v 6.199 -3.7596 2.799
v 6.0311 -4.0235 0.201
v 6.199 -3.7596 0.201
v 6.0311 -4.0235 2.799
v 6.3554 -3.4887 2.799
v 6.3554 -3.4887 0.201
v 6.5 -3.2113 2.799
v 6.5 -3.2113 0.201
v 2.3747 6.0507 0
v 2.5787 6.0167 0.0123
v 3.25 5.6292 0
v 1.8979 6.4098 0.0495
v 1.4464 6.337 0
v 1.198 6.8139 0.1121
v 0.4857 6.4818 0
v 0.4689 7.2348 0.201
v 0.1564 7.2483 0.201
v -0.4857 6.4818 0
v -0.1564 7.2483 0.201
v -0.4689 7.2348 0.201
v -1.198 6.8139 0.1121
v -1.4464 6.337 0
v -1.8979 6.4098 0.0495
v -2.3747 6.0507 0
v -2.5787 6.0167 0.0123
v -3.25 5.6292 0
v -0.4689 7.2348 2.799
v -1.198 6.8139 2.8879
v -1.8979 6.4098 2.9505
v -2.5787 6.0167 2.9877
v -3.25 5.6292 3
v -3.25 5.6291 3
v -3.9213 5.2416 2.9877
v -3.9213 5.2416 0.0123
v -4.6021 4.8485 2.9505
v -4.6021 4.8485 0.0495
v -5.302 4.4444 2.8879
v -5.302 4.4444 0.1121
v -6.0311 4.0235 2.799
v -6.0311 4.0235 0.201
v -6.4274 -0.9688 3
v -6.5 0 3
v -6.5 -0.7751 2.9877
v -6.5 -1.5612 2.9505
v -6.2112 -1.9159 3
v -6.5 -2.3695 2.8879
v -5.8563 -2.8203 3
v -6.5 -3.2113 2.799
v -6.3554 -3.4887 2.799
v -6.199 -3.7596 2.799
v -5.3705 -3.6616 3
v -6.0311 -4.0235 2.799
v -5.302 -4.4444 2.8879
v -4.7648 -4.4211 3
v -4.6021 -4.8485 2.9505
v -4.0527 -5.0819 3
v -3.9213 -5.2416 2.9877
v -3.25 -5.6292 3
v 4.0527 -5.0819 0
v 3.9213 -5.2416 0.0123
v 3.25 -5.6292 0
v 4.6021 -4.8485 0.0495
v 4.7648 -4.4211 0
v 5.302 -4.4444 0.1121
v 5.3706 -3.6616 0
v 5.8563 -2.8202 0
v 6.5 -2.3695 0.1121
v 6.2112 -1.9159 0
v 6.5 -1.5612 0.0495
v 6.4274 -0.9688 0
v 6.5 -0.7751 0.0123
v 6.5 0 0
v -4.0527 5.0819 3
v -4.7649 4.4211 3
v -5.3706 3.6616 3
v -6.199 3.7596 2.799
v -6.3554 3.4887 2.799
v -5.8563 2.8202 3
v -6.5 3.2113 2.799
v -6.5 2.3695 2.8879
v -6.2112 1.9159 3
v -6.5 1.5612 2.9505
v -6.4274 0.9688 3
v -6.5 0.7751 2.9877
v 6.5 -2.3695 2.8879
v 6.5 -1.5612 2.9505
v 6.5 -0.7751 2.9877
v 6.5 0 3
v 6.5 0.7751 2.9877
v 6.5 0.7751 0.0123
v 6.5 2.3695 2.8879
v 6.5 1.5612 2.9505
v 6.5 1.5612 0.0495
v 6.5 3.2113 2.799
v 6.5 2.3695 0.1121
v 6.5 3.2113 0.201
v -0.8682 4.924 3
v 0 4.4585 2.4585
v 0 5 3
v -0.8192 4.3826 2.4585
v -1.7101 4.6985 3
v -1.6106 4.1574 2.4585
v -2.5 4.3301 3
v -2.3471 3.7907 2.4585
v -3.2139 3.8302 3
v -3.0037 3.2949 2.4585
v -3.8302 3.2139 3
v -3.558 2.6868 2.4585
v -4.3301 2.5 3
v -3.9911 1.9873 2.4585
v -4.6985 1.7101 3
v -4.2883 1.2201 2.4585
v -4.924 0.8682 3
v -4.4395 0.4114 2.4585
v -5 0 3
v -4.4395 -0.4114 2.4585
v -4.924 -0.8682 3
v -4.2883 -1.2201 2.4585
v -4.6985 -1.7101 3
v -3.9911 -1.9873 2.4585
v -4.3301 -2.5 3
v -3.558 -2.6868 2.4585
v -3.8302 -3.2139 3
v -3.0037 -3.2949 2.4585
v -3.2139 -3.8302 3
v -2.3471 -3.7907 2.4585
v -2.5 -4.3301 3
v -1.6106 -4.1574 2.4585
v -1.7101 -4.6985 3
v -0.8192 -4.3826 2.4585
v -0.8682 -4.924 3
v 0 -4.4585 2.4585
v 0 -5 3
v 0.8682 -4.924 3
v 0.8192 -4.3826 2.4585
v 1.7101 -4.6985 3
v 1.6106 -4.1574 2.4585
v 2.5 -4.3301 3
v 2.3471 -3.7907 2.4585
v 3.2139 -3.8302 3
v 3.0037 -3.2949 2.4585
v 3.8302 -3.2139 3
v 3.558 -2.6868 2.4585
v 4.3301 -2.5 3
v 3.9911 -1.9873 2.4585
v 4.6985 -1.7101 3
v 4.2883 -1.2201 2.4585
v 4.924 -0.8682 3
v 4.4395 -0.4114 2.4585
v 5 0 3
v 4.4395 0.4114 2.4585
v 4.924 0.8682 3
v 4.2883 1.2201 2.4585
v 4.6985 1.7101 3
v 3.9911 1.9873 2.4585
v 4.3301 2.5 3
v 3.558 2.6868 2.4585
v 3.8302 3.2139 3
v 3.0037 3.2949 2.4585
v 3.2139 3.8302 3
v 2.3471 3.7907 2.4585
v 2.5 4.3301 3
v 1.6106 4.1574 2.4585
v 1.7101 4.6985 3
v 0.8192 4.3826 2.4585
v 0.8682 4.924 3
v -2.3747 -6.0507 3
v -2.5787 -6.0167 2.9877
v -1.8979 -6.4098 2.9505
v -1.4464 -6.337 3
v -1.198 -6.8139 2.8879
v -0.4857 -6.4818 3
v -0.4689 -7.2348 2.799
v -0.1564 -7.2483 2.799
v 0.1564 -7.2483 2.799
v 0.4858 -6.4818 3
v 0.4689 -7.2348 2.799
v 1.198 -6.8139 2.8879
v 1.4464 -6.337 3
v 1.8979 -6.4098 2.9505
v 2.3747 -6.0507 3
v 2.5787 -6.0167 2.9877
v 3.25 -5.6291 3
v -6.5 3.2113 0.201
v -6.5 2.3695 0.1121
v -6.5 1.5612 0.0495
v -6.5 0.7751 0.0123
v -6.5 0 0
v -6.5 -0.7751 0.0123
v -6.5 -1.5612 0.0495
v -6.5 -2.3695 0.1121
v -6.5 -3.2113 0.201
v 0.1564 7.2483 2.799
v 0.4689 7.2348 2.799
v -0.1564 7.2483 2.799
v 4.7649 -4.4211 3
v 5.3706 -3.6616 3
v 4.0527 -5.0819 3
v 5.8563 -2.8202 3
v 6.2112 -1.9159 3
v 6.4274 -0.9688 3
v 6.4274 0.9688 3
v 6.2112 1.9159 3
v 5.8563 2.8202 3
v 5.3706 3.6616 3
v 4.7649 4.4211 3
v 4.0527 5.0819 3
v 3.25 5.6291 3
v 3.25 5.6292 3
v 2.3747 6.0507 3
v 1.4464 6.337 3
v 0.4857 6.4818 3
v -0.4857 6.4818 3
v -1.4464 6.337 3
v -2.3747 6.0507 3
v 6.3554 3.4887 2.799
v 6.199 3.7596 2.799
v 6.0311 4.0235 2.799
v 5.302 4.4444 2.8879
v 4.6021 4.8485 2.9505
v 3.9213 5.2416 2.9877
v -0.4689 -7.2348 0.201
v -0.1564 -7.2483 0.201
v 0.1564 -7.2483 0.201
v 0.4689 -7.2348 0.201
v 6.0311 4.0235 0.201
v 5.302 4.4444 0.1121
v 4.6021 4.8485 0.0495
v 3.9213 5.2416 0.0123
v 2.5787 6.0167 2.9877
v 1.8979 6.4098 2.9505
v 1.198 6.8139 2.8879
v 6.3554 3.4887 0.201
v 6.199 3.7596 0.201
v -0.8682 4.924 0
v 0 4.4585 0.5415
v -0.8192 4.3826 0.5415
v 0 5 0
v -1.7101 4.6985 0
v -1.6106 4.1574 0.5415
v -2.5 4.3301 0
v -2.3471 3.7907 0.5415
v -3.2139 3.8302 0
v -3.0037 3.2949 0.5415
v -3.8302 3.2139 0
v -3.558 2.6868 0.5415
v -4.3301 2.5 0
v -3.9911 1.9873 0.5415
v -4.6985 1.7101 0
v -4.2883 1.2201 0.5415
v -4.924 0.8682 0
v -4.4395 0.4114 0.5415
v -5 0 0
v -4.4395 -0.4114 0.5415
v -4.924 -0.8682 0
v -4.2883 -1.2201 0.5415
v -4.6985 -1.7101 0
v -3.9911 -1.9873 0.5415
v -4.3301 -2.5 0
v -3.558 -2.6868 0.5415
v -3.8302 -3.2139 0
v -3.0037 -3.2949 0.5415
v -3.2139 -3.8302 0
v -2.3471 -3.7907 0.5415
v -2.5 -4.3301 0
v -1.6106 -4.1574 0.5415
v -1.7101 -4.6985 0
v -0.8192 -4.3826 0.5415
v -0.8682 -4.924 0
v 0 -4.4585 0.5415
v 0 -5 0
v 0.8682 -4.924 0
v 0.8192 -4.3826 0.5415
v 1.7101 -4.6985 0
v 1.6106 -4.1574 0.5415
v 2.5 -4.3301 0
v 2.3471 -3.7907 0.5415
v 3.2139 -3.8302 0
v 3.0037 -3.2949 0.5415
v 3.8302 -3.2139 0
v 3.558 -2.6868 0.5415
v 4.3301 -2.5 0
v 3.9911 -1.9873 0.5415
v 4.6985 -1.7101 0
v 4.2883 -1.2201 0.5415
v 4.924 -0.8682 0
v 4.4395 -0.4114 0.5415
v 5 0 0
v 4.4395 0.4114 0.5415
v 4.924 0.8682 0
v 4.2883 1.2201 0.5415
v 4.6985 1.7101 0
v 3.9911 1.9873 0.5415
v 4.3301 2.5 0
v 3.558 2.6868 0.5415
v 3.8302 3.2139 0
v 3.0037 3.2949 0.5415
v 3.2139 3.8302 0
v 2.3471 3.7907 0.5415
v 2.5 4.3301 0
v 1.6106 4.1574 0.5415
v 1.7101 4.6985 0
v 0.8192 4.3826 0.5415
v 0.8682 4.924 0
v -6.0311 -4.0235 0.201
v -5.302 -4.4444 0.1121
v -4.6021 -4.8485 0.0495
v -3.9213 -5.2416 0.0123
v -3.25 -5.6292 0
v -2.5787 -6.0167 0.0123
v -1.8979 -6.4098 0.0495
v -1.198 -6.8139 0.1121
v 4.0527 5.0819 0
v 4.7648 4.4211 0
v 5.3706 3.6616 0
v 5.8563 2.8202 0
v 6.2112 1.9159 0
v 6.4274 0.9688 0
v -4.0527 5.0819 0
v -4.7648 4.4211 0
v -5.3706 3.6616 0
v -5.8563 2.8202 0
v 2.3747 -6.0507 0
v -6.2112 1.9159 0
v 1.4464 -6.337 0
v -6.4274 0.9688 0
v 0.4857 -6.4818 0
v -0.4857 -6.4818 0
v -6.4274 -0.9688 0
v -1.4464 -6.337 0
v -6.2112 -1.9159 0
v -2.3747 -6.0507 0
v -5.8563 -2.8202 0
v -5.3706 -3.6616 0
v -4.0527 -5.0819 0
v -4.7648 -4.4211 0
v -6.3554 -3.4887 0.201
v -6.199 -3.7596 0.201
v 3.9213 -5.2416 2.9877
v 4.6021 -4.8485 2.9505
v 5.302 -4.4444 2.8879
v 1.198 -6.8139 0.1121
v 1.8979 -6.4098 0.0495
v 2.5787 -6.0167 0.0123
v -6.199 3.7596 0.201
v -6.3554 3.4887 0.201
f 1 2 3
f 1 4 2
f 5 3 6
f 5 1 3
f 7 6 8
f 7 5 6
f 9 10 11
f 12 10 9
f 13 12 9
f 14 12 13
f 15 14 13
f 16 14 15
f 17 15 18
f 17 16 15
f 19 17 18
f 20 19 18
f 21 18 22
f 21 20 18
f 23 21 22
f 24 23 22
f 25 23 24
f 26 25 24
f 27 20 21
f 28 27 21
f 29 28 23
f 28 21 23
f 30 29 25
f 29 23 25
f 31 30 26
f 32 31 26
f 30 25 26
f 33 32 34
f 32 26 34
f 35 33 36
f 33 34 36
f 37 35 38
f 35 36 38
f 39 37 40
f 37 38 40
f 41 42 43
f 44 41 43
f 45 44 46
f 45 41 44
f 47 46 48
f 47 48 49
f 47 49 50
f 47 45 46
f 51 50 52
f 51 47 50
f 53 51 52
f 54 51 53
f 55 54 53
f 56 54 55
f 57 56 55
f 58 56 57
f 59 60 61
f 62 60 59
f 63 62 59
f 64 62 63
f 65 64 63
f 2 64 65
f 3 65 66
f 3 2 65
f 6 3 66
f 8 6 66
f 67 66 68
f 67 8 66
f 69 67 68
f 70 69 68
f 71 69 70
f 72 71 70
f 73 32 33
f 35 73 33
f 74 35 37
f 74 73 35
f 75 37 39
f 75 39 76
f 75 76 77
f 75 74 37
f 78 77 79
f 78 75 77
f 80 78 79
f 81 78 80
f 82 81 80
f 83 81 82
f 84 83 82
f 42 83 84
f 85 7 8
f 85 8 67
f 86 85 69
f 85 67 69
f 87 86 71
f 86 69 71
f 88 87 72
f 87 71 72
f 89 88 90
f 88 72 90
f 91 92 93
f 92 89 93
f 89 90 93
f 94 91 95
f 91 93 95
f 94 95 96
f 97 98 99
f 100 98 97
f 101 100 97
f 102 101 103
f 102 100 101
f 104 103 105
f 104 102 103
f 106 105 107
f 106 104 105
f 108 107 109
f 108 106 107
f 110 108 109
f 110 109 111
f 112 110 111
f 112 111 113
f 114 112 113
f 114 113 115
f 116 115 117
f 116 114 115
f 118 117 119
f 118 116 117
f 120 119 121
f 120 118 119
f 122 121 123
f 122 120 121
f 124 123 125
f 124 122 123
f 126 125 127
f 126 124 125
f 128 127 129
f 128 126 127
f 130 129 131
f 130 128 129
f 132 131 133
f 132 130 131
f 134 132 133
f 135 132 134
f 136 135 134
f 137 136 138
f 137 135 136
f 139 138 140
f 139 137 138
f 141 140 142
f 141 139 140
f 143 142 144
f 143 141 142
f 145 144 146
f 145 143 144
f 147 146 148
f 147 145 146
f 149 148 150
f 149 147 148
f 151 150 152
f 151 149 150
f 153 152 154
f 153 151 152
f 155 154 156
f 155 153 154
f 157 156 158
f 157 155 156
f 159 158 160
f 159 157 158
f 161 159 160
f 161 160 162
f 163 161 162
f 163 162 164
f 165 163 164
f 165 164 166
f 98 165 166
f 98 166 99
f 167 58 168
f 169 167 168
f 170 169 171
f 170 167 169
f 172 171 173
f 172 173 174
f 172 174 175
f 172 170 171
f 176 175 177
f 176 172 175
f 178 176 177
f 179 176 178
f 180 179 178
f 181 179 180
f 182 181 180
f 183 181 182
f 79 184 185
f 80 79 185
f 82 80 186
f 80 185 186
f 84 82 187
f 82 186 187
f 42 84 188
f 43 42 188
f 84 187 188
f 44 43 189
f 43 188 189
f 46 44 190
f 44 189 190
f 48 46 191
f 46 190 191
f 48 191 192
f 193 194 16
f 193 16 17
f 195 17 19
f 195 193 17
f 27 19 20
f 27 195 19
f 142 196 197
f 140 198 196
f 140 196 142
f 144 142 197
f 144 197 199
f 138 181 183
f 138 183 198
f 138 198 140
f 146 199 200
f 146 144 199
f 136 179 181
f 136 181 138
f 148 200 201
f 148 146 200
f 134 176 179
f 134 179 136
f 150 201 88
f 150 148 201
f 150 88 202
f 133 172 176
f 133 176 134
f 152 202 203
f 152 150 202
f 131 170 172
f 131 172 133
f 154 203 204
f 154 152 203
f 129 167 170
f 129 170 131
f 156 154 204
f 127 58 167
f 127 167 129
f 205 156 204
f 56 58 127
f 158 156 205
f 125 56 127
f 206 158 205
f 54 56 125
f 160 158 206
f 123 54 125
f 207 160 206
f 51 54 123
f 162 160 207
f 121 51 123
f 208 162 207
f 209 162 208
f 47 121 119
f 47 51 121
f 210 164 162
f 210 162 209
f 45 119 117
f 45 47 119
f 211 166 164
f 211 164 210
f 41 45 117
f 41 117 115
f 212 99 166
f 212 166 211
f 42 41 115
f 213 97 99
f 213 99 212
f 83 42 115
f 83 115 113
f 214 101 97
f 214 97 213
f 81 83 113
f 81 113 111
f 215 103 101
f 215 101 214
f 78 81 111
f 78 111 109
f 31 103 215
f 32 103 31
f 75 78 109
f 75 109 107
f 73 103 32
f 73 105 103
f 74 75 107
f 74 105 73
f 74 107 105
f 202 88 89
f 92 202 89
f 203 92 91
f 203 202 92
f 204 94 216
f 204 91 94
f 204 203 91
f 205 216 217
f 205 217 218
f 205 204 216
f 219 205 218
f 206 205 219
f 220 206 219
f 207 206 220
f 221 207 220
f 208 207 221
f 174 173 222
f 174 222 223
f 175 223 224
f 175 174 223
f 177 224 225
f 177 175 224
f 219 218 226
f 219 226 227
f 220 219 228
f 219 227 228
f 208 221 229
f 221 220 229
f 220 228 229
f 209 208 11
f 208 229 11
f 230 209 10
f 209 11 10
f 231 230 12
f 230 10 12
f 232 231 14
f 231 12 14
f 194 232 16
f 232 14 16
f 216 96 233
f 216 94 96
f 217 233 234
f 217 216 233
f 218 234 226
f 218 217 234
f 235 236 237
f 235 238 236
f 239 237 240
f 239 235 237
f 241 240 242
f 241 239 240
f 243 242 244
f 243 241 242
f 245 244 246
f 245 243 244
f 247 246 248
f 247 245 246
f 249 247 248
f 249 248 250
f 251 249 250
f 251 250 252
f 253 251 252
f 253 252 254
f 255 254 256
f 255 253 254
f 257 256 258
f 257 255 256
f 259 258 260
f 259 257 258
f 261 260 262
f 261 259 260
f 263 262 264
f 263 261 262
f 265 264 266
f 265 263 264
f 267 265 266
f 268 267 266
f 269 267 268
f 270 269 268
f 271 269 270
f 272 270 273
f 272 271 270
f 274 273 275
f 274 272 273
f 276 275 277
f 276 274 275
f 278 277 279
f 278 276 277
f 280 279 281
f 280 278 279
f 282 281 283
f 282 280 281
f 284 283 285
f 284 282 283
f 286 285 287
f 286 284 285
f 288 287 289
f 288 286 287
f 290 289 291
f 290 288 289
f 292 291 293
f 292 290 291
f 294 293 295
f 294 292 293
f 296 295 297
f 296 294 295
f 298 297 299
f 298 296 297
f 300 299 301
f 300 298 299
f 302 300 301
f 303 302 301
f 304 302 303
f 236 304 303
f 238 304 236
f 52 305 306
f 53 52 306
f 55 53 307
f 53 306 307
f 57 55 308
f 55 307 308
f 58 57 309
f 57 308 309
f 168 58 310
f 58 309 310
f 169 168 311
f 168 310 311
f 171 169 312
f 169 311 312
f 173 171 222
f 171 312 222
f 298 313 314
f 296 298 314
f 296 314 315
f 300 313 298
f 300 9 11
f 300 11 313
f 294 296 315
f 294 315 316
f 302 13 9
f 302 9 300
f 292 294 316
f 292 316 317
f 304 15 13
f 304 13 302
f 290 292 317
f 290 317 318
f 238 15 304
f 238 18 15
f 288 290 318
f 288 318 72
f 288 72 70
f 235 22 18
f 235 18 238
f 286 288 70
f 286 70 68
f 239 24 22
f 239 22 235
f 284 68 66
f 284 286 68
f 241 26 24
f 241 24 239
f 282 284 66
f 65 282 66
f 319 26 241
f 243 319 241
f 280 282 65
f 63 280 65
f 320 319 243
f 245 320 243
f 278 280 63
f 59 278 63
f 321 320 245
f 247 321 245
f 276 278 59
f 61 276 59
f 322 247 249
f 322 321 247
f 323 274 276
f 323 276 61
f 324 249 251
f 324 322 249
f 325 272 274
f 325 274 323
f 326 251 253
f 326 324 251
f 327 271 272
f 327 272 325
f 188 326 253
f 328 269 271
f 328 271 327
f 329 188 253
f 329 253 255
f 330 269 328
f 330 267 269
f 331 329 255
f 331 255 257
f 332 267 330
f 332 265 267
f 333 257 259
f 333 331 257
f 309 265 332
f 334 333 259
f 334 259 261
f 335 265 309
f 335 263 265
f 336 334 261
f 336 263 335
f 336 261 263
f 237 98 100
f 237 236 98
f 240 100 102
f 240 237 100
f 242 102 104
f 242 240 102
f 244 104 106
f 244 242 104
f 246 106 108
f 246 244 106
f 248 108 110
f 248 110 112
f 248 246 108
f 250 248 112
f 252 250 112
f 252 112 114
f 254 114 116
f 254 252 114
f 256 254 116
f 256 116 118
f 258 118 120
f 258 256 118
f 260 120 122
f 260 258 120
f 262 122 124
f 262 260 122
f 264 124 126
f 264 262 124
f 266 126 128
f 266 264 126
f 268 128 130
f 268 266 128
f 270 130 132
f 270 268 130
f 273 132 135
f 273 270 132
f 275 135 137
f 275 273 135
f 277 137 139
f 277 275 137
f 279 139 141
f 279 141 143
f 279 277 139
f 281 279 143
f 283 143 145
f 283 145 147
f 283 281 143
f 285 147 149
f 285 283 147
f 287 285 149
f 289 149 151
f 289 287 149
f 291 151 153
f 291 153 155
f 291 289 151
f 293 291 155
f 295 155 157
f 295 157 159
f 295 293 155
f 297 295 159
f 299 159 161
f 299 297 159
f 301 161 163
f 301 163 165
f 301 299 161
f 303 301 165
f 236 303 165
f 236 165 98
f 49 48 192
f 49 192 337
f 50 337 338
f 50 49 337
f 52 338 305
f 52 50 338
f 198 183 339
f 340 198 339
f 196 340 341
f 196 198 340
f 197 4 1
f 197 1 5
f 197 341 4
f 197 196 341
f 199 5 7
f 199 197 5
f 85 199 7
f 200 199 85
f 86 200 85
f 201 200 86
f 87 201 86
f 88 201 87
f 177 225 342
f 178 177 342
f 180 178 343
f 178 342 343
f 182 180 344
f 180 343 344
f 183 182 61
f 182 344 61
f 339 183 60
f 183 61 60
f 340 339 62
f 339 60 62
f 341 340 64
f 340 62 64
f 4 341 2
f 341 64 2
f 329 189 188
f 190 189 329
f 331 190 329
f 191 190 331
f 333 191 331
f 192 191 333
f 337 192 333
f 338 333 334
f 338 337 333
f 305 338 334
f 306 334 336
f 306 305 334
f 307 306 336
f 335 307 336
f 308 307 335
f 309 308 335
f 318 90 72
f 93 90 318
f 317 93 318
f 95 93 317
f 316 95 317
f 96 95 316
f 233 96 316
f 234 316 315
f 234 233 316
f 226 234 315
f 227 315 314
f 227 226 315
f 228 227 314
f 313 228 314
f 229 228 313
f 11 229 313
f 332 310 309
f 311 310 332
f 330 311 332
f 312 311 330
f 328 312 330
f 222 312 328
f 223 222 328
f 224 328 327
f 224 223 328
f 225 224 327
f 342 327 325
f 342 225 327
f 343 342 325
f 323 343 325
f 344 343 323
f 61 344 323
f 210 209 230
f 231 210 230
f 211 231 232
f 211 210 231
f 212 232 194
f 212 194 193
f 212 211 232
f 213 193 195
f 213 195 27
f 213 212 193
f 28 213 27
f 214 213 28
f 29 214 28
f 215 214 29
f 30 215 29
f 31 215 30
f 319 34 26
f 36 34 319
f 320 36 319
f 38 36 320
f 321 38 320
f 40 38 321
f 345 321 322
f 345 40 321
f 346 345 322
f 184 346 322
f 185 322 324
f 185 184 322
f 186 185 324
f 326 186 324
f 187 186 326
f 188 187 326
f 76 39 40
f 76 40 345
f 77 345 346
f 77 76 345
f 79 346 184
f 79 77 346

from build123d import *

# Parameters (mm, degrees)
SCHNITT_LINEAR_AUSTRAGEN1_DEPTH      = 10
SCHNITT_LINEAR_AUSTRAGEN1_DEPTH_BACK = 10
SKIZZE2_W                            = 69.6667
SKIZZE2_H                            = 68.6667


with BuildPart() as part:
    # Skizze1 → Rotation1 (revolve)
    with BuildSketch(Plane(origin=(0, 0, 0), x_dir=(0, 0, -1), z_dir=(1, 0, 0))):
        Polygon((-3, 6.5), (-3, 5), (-2.4585, 4.4585), (-0.5415, 4.4585), (0, 5), (0, 6.5), (-0.200961894, 7.25), (-2.799038106, 7.25), align=None)
    revolve(axis=Axis((0, 0, 0), (0, 0, 1)))

    # Skizze2 → Schnitt-Linear austragen1 (cut, two sides: drawn at the far end of the back side and taken through both)
    with BuildSketch(Plane.XY.offset(-SCHNITT_LINEAR_AUSTRAGEN1_DEPTH_BACK)):
        with Locations((-1.75005, -1.16665)):
            Rectangle(SKIZZE2_W, SKIZZE2_H)
        Polygon((-6.5, -3.75277675), (0, -7.505553499), (6.5, -3.75277675), (6.5, 3.75277675), (0, 7.505553499), (-6.5, 3.75277675), align=None, mode=Mode.SUBTRACT)
    extrude(amount=SCHNITT_LINEAR_AUSTRAGEN1_DEPTH + SCHNITT_LINEAR_AUSTRAGEN1_DEPTH_BACK, mode=Mode.SUBTRACT)


solid = part.part
